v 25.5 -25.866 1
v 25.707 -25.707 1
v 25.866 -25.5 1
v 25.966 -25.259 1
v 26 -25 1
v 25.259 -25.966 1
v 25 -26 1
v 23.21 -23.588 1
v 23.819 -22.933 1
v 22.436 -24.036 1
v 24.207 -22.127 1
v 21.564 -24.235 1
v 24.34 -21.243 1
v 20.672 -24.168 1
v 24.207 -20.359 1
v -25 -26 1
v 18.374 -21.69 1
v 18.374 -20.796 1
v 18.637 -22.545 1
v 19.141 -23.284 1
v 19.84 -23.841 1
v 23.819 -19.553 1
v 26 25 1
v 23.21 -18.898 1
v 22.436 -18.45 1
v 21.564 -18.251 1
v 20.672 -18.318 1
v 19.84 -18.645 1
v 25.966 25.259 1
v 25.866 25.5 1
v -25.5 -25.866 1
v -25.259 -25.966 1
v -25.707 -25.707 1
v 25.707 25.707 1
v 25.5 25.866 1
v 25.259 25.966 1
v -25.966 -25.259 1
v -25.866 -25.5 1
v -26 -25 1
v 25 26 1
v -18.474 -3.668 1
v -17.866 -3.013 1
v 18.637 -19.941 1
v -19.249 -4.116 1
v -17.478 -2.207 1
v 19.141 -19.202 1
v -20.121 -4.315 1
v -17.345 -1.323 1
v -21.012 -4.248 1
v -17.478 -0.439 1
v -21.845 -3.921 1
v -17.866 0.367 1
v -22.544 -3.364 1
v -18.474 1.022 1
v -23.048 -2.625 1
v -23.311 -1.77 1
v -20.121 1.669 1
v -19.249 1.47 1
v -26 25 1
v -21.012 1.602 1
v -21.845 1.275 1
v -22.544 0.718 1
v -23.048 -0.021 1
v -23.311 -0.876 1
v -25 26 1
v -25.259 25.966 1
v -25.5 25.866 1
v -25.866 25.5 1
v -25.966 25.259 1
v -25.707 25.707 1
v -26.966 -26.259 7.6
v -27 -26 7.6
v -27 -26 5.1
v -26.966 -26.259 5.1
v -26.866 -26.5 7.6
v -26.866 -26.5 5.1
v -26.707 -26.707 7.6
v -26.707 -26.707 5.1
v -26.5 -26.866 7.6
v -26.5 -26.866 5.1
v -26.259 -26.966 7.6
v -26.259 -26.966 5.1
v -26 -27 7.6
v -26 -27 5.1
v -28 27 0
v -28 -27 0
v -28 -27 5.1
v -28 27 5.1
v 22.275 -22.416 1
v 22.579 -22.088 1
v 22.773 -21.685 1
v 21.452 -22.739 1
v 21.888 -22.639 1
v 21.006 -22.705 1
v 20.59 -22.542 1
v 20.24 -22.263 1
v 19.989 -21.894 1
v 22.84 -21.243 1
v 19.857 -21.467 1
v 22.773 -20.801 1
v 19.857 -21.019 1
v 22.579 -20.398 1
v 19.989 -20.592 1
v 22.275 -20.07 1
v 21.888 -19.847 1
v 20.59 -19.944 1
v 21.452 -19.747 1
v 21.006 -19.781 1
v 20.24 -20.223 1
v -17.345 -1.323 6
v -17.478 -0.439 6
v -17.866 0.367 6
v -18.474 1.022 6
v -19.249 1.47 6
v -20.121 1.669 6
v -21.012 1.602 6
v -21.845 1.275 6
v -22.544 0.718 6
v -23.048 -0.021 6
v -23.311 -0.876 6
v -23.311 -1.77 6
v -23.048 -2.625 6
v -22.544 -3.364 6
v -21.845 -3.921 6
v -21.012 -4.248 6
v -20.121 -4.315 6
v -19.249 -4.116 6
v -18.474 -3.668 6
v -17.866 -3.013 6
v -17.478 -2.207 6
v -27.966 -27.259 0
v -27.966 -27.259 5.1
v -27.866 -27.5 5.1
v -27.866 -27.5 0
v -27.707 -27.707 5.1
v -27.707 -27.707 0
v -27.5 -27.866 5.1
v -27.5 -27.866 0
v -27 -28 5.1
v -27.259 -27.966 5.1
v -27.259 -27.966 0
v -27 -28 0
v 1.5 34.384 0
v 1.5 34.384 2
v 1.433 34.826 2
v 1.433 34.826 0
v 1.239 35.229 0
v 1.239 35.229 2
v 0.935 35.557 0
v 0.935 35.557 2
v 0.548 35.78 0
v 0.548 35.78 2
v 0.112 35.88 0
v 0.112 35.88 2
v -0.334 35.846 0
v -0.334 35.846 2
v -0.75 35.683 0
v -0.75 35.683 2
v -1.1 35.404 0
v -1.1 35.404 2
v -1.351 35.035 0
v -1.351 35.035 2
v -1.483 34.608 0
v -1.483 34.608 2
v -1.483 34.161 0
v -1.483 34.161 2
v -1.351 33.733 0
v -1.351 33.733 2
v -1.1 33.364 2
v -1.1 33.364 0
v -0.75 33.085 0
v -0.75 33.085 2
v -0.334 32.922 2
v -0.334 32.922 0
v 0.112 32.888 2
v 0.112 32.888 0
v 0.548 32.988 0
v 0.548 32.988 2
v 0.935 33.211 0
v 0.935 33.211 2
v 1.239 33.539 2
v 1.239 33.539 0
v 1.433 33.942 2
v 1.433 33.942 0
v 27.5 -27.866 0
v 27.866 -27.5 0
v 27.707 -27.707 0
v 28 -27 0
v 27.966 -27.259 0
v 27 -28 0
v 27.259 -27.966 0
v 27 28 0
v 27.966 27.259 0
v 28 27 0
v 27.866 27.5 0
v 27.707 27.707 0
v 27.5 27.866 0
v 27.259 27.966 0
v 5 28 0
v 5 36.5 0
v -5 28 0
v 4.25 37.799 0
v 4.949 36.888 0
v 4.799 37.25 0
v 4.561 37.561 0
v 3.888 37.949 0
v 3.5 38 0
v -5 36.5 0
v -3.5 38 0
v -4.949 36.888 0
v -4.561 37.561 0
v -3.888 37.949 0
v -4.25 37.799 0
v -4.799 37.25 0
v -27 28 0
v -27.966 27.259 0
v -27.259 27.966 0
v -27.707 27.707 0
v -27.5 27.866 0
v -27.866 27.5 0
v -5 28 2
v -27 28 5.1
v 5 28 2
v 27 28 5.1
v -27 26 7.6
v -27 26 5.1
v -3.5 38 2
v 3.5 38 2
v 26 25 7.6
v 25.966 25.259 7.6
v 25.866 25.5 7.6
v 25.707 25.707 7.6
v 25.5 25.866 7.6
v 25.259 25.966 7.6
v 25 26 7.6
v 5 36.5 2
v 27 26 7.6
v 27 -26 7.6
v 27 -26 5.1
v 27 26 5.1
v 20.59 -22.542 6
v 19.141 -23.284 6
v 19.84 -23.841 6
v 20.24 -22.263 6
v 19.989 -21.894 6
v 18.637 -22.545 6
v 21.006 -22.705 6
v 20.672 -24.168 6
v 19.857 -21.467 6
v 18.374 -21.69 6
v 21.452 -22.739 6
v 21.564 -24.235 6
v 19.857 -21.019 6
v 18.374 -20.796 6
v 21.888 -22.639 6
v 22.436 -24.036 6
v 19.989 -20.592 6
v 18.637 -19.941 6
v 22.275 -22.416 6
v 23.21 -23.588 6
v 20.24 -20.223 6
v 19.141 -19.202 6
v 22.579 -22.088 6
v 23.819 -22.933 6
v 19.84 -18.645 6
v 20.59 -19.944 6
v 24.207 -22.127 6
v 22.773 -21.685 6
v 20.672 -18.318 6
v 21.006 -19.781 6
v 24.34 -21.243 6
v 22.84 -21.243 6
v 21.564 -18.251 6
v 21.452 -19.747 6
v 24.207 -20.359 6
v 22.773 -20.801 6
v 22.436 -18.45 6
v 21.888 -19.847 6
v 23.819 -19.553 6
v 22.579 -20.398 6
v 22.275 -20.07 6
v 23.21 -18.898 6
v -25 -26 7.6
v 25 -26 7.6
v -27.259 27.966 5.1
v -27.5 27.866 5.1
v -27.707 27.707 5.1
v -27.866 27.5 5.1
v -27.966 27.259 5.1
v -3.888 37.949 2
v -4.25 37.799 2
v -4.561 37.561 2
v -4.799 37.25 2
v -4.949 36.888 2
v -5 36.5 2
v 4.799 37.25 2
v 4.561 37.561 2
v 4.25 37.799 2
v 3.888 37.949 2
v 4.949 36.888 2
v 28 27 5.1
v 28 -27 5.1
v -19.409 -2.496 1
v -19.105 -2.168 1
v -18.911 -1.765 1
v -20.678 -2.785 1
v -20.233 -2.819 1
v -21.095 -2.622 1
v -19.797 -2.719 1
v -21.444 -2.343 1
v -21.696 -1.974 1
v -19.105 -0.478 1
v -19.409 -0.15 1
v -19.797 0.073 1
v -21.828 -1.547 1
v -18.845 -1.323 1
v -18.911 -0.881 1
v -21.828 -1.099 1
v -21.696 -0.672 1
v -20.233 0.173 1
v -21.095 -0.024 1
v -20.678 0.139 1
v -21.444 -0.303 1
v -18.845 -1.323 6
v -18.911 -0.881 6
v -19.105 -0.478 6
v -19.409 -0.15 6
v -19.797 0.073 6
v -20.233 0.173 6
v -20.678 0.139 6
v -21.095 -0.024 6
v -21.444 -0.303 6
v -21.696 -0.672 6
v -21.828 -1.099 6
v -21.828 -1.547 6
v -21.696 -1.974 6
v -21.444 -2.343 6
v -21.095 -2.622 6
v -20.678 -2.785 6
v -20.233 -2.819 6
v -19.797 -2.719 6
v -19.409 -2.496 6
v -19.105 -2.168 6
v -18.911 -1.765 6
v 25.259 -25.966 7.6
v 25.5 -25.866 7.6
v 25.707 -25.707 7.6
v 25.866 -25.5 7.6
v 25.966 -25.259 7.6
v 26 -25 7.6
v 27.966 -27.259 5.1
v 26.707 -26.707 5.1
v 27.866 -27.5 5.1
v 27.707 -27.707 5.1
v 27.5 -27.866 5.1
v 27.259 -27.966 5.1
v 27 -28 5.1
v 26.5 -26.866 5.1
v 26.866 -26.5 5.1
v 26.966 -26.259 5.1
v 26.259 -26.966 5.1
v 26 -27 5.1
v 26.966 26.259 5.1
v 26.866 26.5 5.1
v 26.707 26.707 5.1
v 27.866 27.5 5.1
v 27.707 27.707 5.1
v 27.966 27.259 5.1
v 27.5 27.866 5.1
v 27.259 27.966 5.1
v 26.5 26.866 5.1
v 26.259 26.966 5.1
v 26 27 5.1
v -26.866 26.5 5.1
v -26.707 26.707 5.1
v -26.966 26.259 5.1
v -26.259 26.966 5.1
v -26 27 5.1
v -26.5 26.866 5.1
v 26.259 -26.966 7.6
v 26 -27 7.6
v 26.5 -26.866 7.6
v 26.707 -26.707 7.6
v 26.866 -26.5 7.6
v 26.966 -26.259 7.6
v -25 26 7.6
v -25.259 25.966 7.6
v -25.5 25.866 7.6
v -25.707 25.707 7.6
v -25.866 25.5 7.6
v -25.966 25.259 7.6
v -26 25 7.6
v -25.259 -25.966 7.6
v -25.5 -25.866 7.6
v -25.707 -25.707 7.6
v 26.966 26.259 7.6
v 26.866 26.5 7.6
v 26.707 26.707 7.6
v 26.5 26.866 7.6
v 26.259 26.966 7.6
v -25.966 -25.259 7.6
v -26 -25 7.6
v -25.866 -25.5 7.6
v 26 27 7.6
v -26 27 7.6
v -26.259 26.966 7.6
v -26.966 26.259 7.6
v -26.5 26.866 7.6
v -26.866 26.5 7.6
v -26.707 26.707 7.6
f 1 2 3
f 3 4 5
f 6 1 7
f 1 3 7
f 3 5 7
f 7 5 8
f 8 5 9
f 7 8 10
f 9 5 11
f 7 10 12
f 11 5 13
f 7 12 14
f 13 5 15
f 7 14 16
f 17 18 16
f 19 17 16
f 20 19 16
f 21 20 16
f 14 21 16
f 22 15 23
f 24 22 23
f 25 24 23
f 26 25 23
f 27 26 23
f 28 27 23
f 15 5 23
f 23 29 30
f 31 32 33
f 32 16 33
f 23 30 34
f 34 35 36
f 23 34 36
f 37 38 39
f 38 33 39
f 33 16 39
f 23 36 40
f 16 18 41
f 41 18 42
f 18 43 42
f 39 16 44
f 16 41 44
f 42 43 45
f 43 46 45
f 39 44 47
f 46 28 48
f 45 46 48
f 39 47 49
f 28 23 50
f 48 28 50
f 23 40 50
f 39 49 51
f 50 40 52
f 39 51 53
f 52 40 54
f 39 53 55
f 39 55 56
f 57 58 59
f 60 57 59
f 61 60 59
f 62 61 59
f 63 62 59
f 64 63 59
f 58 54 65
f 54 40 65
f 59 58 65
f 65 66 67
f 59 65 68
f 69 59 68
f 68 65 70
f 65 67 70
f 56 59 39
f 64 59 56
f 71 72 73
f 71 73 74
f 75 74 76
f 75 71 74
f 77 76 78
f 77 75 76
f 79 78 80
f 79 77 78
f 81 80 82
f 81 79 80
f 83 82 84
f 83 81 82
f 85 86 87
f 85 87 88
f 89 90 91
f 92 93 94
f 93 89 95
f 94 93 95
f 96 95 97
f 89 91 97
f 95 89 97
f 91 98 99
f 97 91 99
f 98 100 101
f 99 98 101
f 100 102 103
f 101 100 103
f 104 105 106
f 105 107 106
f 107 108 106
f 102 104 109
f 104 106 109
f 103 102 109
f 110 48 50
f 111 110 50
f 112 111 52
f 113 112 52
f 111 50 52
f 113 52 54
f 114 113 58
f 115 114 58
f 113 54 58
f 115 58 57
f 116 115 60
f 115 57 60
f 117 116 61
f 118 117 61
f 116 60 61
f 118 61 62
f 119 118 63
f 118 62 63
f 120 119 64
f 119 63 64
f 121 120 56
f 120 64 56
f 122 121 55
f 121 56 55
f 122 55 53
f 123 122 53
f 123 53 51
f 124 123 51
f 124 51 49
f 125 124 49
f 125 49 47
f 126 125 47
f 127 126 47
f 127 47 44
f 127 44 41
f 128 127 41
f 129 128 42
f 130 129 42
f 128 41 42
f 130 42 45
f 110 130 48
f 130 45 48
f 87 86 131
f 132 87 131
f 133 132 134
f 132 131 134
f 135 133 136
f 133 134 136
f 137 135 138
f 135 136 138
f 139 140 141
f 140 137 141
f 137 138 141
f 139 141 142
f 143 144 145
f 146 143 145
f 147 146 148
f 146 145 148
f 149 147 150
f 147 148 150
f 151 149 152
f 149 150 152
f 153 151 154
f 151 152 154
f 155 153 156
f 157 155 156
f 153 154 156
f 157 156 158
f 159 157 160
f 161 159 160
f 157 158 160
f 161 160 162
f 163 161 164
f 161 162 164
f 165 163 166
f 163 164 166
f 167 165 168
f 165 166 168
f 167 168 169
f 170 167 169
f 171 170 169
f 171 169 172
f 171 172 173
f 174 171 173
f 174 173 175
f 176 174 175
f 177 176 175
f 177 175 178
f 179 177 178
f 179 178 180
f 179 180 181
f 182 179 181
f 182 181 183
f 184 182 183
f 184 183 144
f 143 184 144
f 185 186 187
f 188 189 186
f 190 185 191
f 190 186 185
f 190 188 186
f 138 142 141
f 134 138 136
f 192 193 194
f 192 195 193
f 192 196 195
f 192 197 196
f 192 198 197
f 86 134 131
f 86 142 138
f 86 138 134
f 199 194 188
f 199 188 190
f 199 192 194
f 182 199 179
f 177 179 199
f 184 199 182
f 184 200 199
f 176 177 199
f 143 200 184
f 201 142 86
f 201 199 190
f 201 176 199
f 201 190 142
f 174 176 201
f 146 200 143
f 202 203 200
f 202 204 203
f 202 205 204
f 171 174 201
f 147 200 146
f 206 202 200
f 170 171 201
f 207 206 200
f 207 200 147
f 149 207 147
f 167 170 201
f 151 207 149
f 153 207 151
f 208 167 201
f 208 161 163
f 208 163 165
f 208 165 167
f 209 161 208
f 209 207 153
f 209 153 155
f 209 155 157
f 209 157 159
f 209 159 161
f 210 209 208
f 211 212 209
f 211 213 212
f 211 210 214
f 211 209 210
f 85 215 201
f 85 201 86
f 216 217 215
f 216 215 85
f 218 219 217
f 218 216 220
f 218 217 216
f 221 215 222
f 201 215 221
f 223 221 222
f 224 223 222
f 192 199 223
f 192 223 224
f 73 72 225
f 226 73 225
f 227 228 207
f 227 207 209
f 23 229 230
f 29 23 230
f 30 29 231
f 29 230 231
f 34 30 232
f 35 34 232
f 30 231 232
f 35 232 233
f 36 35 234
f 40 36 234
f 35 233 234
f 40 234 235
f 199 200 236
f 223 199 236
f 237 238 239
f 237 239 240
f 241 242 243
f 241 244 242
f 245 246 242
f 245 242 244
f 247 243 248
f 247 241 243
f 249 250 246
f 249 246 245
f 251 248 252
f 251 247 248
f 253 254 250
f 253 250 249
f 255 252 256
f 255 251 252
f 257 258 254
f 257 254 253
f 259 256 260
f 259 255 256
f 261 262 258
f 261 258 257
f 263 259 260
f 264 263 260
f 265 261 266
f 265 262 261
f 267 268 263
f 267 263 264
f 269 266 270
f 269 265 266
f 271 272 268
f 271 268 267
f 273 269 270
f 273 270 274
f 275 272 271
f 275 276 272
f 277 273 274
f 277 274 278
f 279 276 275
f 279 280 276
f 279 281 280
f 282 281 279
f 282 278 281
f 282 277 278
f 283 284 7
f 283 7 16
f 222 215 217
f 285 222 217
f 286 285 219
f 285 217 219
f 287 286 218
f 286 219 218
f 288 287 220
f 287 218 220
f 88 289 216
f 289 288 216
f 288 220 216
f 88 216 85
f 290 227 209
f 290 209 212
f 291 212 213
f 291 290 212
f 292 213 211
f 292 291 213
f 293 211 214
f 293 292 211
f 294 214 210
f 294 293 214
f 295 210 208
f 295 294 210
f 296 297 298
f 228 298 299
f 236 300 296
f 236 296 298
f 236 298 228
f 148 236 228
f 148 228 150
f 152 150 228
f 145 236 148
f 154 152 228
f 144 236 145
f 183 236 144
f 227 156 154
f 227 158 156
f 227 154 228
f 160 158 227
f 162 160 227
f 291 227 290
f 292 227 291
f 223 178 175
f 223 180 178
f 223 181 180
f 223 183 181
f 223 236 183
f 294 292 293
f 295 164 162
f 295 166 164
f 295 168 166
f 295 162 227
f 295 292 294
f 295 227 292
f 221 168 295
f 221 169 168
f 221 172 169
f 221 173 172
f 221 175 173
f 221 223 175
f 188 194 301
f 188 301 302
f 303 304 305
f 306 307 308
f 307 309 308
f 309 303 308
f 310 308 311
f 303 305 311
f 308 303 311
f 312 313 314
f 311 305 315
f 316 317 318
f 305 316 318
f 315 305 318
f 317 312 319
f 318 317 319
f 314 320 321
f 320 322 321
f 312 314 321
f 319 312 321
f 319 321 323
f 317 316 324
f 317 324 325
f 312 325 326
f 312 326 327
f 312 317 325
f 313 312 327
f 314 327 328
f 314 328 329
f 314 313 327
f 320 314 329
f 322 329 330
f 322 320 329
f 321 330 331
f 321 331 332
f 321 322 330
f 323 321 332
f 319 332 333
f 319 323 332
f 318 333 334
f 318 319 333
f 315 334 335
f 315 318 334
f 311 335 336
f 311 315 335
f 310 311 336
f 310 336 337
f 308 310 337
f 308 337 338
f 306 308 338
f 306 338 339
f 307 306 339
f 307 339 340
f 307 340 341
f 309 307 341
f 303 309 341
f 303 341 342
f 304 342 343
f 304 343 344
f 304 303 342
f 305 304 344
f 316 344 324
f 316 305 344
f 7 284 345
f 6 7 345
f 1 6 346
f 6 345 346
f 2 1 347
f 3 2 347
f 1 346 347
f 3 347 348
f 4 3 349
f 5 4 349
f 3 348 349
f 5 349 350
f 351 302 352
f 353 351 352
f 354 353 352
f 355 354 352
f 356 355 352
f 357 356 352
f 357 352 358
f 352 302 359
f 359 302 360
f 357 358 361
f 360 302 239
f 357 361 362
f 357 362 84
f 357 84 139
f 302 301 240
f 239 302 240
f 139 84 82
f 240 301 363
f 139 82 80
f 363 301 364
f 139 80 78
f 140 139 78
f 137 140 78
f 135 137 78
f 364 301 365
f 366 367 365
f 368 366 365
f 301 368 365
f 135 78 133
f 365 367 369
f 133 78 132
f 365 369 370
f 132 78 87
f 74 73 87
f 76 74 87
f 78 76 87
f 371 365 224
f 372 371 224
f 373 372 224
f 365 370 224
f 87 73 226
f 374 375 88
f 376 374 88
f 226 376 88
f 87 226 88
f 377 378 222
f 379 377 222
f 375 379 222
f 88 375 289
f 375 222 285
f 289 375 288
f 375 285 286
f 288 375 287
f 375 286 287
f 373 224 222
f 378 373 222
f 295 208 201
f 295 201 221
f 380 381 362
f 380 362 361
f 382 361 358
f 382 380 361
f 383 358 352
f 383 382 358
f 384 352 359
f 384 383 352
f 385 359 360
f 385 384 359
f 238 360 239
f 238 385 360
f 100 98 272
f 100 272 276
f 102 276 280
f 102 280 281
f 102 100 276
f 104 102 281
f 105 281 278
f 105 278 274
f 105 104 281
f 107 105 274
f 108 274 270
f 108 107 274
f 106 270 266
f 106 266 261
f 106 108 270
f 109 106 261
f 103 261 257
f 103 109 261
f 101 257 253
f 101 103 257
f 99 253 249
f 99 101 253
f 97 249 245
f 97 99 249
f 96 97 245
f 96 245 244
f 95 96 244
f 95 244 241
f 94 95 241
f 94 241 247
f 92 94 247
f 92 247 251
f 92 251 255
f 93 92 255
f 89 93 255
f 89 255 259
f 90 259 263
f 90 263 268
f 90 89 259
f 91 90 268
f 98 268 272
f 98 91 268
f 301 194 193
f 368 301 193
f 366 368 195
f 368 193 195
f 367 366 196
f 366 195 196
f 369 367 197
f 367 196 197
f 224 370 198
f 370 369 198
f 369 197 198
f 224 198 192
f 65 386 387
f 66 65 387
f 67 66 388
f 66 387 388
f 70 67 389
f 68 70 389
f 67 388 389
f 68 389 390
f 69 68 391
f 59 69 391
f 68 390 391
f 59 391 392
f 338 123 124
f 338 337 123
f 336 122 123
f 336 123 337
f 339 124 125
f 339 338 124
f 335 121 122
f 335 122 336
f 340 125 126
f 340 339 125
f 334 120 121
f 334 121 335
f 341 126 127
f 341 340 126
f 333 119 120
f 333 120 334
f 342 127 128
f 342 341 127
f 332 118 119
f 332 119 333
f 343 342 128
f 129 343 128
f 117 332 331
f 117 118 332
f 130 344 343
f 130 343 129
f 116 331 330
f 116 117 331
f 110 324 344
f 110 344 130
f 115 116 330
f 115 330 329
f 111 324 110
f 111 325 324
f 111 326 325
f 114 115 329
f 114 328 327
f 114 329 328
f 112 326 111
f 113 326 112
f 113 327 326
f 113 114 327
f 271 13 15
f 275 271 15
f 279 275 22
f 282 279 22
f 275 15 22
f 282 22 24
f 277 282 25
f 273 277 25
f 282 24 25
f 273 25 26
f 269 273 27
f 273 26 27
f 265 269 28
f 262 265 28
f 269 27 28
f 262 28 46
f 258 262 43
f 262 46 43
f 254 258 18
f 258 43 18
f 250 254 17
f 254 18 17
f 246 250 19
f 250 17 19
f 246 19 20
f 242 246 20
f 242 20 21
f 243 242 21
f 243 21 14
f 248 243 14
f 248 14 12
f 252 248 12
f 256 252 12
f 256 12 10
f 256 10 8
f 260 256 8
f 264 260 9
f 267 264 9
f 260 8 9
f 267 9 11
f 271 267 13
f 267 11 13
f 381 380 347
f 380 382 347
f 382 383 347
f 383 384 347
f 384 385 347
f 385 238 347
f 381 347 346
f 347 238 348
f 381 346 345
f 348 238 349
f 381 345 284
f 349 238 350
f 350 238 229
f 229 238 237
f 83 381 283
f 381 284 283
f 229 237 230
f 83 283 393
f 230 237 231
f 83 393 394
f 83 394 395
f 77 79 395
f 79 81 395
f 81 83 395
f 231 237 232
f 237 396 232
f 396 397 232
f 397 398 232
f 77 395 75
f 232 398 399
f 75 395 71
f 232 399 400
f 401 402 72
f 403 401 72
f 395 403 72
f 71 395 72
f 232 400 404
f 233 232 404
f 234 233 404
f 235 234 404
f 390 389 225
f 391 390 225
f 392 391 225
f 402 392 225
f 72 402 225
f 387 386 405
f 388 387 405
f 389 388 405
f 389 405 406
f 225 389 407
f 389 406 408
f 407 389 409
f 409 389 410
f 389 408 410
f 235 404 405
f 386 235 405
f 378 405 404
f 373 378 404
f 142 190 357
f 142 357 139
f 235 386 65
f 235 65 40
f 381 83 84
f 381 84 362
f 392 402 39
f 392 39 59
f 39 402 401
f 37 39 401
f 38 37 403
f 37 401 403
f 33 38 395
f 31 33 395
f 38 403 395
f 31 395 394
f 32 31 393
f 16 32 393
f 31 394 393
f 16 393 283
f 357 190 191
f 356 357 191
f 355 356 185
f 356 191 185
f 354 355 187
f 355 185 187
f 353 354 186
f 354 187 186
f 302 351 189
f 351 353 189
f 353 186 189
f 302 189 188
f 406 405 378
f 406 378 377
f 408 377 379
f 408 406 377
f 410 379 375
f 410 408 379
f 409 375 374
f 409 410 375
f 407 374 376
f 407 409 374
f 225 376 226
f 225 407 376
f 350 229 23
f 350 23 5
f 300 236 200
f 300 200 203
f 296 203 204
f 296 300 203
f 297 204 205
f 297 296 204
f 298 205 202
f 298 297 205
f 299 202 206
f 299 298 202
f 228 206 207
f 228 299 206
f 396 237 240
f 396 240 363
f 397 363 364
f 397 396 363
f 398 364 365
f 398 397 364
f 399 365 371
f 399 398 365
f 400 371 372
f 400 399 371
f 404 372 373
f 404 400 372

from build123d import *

# Parameters (mm, degrees)
PAD_DEPTH       = 7.6
POCKET_DEPTH    = 6.6
SKETCH002_R     = 3
SKETCH002_R_2   = 1.5
PAD001_DEPTH    = 5
POCKET001_DEPTH = 2.5
SKETCH004_W     = 10
SKETCH004_H     = 2
PAD002_DEPTH    = 10
SKETCH005_R     = 1.5
POCKET002_DEPTH = 5


with BuildPart() as part:
    # Sketch → Pad (new body)
    with BuildSketch(Plane.XY):
        with BuildLine():
            Line((-27, 28), (27, 28))
            ThreePointArc((28, 27), (27.707107, 27.707107), (27, 28))
            Line((28, 27), (28, -27))
            ThreePointArc((27, -28), (27.707107, -27.707107), (28, -27))
            Line((27, -28), (-27, -28))
            ThreePointArc((-28, -27), (-27.707107, -27.707107), (-27, -28))
            Line((-28, -27), (-28, 27))
            ThreePointArc((-27, 28), (-27.707107, 27.707107), (-28, 27))
        make_face()
    extrude(amount=PAD_DEPTH)

    # Sketch001 (on Face10 of Pad) → Pocket (cut)
    with BuildSketch(Plane.XY.offset(7.6)):
        with BuildLine():
            Line((-25, 26), (25, 26))
            ThreePointArc((26, 25), (25.707107, 25.707107), (25, 26))
            Line((26, 25), (26, -25))
            ThreePointArc((25, -26), (25.707107, -25.707107), (26, -25))
            Line((25, -26), (-25, -26))
            ThreePointArc((-26, -25), (-25.707107, -25.707107), (-25, -26))
            Line((-26, -25), (-26, 25))
            ThreePointArc((-25, 26), (-25.707107, 25.707107), (-26, 25))
        make_face()
    extrude(amount=-POCKET_DEPTH, mode=Mode.SUBTRACT)

    # Sketch002 (on Face19 of Pocket) → Pad001 (join)
    with BuildSketch(Plane.XY.offset(1)):
        with Locations((-20.3447, -1.323)):
            Circle(SKETCH002_R)
        with Locations((-20.3447, -1.323)):
            Circle(SKETCH002_R_2, mode=Mode.SUBTRACT)
        with Locations((21.34, -21.243)):
            Circle(SKETCH002_R)
        with Locations((21.34, -21.243)):
            Circle(SKETCH002_R_2, mode=Mode.SUBTRACT)
    extrude(amount=PAD001_DEPTH)

    # Sketch003 (on Face5 of Pad001) → Pocket001 (cut)
    with BuildSketch(Plane.XY.offset(7.6)):
        Polygon((27.14591, 28.064611), (28.06645, 28.064611), (28.06645, -28.099016), (27.14591, -28.099016), (-28.144796, -28.099016), (-28.144796, -26.750607), (-28.144796, 28.064611), (-26.614367, 28.064611), align=None)
        with BuildLine():
            Line((27, -26), (27, 26))
            ThreePointArc((27, 26), (26.707107, 26.707107), (26, 27))
            Line((-26, 27), (26, 27))
            ThreePointArc((-26, 27), (-26.707107, 26.707107), (-27, 26))
            Line((-27, -26), (-27, 26))
            ThreePointArc((-27, -26), (-26.707107, -26.707107), (-26, -27))
            Line((-26, -27), (26, -27))
            ThreePointArc((26, -27), (26.707107, -26.707107), (27, -26))
        make_face(mode=Mode.SUBTRACT)
    extrude(amount=-POCKET001_DEPTH, mode=Mode.SUBTRACT)

    # Sketch004 (on Face6 of Pocket001) → Pad002 (join)
    with BuildSketch(Plane(origin=(0, 28, 0), x_dir=(-1, 0, 0), z_dir=(0, 1, 0))):
        with Locations((0, 1)):
            Rectangle(SKETCH004_W, SKETCH004_H)
    extrude(amount=PAD002_DEPTH)

    # Sketch005 (on Face21 of Pad002) → Pocket002 (cut)
    with BuildSketch(Plane.XY.offset(2)):
        with Locations((0, 34.384102)):
            Circle(SKETCH005_R)
        with BuildLine():
            Line((-3.5, 38), (3.5, 38))
            ThreePointArc((5, 36.5), (4.56066, 37.56066), (3.5, 38))
            Line((5, 36.5), (5, 28))
            Line((5.691499, 28), (5, 28))
            Line((5.691499, 38.719643), (5.691499, 28))
            Line((-5.537798, 38.719643), (5.691499, 38.719643))
            Line((-5.537798, 28), (-5.537798, 38.719643))
            Line((-5, 28), (-5.537798, 28))
            Line((-5, 36.5), (-5, 28))
            ThreePointArc((-3.5, 38), (-4.56066, 37.56066), (-5, 36.5))
        make_face()
    extrude(amount=-POCKET002_DEPTH, mode=Mode.SUBTRACT)


solid = part.part
